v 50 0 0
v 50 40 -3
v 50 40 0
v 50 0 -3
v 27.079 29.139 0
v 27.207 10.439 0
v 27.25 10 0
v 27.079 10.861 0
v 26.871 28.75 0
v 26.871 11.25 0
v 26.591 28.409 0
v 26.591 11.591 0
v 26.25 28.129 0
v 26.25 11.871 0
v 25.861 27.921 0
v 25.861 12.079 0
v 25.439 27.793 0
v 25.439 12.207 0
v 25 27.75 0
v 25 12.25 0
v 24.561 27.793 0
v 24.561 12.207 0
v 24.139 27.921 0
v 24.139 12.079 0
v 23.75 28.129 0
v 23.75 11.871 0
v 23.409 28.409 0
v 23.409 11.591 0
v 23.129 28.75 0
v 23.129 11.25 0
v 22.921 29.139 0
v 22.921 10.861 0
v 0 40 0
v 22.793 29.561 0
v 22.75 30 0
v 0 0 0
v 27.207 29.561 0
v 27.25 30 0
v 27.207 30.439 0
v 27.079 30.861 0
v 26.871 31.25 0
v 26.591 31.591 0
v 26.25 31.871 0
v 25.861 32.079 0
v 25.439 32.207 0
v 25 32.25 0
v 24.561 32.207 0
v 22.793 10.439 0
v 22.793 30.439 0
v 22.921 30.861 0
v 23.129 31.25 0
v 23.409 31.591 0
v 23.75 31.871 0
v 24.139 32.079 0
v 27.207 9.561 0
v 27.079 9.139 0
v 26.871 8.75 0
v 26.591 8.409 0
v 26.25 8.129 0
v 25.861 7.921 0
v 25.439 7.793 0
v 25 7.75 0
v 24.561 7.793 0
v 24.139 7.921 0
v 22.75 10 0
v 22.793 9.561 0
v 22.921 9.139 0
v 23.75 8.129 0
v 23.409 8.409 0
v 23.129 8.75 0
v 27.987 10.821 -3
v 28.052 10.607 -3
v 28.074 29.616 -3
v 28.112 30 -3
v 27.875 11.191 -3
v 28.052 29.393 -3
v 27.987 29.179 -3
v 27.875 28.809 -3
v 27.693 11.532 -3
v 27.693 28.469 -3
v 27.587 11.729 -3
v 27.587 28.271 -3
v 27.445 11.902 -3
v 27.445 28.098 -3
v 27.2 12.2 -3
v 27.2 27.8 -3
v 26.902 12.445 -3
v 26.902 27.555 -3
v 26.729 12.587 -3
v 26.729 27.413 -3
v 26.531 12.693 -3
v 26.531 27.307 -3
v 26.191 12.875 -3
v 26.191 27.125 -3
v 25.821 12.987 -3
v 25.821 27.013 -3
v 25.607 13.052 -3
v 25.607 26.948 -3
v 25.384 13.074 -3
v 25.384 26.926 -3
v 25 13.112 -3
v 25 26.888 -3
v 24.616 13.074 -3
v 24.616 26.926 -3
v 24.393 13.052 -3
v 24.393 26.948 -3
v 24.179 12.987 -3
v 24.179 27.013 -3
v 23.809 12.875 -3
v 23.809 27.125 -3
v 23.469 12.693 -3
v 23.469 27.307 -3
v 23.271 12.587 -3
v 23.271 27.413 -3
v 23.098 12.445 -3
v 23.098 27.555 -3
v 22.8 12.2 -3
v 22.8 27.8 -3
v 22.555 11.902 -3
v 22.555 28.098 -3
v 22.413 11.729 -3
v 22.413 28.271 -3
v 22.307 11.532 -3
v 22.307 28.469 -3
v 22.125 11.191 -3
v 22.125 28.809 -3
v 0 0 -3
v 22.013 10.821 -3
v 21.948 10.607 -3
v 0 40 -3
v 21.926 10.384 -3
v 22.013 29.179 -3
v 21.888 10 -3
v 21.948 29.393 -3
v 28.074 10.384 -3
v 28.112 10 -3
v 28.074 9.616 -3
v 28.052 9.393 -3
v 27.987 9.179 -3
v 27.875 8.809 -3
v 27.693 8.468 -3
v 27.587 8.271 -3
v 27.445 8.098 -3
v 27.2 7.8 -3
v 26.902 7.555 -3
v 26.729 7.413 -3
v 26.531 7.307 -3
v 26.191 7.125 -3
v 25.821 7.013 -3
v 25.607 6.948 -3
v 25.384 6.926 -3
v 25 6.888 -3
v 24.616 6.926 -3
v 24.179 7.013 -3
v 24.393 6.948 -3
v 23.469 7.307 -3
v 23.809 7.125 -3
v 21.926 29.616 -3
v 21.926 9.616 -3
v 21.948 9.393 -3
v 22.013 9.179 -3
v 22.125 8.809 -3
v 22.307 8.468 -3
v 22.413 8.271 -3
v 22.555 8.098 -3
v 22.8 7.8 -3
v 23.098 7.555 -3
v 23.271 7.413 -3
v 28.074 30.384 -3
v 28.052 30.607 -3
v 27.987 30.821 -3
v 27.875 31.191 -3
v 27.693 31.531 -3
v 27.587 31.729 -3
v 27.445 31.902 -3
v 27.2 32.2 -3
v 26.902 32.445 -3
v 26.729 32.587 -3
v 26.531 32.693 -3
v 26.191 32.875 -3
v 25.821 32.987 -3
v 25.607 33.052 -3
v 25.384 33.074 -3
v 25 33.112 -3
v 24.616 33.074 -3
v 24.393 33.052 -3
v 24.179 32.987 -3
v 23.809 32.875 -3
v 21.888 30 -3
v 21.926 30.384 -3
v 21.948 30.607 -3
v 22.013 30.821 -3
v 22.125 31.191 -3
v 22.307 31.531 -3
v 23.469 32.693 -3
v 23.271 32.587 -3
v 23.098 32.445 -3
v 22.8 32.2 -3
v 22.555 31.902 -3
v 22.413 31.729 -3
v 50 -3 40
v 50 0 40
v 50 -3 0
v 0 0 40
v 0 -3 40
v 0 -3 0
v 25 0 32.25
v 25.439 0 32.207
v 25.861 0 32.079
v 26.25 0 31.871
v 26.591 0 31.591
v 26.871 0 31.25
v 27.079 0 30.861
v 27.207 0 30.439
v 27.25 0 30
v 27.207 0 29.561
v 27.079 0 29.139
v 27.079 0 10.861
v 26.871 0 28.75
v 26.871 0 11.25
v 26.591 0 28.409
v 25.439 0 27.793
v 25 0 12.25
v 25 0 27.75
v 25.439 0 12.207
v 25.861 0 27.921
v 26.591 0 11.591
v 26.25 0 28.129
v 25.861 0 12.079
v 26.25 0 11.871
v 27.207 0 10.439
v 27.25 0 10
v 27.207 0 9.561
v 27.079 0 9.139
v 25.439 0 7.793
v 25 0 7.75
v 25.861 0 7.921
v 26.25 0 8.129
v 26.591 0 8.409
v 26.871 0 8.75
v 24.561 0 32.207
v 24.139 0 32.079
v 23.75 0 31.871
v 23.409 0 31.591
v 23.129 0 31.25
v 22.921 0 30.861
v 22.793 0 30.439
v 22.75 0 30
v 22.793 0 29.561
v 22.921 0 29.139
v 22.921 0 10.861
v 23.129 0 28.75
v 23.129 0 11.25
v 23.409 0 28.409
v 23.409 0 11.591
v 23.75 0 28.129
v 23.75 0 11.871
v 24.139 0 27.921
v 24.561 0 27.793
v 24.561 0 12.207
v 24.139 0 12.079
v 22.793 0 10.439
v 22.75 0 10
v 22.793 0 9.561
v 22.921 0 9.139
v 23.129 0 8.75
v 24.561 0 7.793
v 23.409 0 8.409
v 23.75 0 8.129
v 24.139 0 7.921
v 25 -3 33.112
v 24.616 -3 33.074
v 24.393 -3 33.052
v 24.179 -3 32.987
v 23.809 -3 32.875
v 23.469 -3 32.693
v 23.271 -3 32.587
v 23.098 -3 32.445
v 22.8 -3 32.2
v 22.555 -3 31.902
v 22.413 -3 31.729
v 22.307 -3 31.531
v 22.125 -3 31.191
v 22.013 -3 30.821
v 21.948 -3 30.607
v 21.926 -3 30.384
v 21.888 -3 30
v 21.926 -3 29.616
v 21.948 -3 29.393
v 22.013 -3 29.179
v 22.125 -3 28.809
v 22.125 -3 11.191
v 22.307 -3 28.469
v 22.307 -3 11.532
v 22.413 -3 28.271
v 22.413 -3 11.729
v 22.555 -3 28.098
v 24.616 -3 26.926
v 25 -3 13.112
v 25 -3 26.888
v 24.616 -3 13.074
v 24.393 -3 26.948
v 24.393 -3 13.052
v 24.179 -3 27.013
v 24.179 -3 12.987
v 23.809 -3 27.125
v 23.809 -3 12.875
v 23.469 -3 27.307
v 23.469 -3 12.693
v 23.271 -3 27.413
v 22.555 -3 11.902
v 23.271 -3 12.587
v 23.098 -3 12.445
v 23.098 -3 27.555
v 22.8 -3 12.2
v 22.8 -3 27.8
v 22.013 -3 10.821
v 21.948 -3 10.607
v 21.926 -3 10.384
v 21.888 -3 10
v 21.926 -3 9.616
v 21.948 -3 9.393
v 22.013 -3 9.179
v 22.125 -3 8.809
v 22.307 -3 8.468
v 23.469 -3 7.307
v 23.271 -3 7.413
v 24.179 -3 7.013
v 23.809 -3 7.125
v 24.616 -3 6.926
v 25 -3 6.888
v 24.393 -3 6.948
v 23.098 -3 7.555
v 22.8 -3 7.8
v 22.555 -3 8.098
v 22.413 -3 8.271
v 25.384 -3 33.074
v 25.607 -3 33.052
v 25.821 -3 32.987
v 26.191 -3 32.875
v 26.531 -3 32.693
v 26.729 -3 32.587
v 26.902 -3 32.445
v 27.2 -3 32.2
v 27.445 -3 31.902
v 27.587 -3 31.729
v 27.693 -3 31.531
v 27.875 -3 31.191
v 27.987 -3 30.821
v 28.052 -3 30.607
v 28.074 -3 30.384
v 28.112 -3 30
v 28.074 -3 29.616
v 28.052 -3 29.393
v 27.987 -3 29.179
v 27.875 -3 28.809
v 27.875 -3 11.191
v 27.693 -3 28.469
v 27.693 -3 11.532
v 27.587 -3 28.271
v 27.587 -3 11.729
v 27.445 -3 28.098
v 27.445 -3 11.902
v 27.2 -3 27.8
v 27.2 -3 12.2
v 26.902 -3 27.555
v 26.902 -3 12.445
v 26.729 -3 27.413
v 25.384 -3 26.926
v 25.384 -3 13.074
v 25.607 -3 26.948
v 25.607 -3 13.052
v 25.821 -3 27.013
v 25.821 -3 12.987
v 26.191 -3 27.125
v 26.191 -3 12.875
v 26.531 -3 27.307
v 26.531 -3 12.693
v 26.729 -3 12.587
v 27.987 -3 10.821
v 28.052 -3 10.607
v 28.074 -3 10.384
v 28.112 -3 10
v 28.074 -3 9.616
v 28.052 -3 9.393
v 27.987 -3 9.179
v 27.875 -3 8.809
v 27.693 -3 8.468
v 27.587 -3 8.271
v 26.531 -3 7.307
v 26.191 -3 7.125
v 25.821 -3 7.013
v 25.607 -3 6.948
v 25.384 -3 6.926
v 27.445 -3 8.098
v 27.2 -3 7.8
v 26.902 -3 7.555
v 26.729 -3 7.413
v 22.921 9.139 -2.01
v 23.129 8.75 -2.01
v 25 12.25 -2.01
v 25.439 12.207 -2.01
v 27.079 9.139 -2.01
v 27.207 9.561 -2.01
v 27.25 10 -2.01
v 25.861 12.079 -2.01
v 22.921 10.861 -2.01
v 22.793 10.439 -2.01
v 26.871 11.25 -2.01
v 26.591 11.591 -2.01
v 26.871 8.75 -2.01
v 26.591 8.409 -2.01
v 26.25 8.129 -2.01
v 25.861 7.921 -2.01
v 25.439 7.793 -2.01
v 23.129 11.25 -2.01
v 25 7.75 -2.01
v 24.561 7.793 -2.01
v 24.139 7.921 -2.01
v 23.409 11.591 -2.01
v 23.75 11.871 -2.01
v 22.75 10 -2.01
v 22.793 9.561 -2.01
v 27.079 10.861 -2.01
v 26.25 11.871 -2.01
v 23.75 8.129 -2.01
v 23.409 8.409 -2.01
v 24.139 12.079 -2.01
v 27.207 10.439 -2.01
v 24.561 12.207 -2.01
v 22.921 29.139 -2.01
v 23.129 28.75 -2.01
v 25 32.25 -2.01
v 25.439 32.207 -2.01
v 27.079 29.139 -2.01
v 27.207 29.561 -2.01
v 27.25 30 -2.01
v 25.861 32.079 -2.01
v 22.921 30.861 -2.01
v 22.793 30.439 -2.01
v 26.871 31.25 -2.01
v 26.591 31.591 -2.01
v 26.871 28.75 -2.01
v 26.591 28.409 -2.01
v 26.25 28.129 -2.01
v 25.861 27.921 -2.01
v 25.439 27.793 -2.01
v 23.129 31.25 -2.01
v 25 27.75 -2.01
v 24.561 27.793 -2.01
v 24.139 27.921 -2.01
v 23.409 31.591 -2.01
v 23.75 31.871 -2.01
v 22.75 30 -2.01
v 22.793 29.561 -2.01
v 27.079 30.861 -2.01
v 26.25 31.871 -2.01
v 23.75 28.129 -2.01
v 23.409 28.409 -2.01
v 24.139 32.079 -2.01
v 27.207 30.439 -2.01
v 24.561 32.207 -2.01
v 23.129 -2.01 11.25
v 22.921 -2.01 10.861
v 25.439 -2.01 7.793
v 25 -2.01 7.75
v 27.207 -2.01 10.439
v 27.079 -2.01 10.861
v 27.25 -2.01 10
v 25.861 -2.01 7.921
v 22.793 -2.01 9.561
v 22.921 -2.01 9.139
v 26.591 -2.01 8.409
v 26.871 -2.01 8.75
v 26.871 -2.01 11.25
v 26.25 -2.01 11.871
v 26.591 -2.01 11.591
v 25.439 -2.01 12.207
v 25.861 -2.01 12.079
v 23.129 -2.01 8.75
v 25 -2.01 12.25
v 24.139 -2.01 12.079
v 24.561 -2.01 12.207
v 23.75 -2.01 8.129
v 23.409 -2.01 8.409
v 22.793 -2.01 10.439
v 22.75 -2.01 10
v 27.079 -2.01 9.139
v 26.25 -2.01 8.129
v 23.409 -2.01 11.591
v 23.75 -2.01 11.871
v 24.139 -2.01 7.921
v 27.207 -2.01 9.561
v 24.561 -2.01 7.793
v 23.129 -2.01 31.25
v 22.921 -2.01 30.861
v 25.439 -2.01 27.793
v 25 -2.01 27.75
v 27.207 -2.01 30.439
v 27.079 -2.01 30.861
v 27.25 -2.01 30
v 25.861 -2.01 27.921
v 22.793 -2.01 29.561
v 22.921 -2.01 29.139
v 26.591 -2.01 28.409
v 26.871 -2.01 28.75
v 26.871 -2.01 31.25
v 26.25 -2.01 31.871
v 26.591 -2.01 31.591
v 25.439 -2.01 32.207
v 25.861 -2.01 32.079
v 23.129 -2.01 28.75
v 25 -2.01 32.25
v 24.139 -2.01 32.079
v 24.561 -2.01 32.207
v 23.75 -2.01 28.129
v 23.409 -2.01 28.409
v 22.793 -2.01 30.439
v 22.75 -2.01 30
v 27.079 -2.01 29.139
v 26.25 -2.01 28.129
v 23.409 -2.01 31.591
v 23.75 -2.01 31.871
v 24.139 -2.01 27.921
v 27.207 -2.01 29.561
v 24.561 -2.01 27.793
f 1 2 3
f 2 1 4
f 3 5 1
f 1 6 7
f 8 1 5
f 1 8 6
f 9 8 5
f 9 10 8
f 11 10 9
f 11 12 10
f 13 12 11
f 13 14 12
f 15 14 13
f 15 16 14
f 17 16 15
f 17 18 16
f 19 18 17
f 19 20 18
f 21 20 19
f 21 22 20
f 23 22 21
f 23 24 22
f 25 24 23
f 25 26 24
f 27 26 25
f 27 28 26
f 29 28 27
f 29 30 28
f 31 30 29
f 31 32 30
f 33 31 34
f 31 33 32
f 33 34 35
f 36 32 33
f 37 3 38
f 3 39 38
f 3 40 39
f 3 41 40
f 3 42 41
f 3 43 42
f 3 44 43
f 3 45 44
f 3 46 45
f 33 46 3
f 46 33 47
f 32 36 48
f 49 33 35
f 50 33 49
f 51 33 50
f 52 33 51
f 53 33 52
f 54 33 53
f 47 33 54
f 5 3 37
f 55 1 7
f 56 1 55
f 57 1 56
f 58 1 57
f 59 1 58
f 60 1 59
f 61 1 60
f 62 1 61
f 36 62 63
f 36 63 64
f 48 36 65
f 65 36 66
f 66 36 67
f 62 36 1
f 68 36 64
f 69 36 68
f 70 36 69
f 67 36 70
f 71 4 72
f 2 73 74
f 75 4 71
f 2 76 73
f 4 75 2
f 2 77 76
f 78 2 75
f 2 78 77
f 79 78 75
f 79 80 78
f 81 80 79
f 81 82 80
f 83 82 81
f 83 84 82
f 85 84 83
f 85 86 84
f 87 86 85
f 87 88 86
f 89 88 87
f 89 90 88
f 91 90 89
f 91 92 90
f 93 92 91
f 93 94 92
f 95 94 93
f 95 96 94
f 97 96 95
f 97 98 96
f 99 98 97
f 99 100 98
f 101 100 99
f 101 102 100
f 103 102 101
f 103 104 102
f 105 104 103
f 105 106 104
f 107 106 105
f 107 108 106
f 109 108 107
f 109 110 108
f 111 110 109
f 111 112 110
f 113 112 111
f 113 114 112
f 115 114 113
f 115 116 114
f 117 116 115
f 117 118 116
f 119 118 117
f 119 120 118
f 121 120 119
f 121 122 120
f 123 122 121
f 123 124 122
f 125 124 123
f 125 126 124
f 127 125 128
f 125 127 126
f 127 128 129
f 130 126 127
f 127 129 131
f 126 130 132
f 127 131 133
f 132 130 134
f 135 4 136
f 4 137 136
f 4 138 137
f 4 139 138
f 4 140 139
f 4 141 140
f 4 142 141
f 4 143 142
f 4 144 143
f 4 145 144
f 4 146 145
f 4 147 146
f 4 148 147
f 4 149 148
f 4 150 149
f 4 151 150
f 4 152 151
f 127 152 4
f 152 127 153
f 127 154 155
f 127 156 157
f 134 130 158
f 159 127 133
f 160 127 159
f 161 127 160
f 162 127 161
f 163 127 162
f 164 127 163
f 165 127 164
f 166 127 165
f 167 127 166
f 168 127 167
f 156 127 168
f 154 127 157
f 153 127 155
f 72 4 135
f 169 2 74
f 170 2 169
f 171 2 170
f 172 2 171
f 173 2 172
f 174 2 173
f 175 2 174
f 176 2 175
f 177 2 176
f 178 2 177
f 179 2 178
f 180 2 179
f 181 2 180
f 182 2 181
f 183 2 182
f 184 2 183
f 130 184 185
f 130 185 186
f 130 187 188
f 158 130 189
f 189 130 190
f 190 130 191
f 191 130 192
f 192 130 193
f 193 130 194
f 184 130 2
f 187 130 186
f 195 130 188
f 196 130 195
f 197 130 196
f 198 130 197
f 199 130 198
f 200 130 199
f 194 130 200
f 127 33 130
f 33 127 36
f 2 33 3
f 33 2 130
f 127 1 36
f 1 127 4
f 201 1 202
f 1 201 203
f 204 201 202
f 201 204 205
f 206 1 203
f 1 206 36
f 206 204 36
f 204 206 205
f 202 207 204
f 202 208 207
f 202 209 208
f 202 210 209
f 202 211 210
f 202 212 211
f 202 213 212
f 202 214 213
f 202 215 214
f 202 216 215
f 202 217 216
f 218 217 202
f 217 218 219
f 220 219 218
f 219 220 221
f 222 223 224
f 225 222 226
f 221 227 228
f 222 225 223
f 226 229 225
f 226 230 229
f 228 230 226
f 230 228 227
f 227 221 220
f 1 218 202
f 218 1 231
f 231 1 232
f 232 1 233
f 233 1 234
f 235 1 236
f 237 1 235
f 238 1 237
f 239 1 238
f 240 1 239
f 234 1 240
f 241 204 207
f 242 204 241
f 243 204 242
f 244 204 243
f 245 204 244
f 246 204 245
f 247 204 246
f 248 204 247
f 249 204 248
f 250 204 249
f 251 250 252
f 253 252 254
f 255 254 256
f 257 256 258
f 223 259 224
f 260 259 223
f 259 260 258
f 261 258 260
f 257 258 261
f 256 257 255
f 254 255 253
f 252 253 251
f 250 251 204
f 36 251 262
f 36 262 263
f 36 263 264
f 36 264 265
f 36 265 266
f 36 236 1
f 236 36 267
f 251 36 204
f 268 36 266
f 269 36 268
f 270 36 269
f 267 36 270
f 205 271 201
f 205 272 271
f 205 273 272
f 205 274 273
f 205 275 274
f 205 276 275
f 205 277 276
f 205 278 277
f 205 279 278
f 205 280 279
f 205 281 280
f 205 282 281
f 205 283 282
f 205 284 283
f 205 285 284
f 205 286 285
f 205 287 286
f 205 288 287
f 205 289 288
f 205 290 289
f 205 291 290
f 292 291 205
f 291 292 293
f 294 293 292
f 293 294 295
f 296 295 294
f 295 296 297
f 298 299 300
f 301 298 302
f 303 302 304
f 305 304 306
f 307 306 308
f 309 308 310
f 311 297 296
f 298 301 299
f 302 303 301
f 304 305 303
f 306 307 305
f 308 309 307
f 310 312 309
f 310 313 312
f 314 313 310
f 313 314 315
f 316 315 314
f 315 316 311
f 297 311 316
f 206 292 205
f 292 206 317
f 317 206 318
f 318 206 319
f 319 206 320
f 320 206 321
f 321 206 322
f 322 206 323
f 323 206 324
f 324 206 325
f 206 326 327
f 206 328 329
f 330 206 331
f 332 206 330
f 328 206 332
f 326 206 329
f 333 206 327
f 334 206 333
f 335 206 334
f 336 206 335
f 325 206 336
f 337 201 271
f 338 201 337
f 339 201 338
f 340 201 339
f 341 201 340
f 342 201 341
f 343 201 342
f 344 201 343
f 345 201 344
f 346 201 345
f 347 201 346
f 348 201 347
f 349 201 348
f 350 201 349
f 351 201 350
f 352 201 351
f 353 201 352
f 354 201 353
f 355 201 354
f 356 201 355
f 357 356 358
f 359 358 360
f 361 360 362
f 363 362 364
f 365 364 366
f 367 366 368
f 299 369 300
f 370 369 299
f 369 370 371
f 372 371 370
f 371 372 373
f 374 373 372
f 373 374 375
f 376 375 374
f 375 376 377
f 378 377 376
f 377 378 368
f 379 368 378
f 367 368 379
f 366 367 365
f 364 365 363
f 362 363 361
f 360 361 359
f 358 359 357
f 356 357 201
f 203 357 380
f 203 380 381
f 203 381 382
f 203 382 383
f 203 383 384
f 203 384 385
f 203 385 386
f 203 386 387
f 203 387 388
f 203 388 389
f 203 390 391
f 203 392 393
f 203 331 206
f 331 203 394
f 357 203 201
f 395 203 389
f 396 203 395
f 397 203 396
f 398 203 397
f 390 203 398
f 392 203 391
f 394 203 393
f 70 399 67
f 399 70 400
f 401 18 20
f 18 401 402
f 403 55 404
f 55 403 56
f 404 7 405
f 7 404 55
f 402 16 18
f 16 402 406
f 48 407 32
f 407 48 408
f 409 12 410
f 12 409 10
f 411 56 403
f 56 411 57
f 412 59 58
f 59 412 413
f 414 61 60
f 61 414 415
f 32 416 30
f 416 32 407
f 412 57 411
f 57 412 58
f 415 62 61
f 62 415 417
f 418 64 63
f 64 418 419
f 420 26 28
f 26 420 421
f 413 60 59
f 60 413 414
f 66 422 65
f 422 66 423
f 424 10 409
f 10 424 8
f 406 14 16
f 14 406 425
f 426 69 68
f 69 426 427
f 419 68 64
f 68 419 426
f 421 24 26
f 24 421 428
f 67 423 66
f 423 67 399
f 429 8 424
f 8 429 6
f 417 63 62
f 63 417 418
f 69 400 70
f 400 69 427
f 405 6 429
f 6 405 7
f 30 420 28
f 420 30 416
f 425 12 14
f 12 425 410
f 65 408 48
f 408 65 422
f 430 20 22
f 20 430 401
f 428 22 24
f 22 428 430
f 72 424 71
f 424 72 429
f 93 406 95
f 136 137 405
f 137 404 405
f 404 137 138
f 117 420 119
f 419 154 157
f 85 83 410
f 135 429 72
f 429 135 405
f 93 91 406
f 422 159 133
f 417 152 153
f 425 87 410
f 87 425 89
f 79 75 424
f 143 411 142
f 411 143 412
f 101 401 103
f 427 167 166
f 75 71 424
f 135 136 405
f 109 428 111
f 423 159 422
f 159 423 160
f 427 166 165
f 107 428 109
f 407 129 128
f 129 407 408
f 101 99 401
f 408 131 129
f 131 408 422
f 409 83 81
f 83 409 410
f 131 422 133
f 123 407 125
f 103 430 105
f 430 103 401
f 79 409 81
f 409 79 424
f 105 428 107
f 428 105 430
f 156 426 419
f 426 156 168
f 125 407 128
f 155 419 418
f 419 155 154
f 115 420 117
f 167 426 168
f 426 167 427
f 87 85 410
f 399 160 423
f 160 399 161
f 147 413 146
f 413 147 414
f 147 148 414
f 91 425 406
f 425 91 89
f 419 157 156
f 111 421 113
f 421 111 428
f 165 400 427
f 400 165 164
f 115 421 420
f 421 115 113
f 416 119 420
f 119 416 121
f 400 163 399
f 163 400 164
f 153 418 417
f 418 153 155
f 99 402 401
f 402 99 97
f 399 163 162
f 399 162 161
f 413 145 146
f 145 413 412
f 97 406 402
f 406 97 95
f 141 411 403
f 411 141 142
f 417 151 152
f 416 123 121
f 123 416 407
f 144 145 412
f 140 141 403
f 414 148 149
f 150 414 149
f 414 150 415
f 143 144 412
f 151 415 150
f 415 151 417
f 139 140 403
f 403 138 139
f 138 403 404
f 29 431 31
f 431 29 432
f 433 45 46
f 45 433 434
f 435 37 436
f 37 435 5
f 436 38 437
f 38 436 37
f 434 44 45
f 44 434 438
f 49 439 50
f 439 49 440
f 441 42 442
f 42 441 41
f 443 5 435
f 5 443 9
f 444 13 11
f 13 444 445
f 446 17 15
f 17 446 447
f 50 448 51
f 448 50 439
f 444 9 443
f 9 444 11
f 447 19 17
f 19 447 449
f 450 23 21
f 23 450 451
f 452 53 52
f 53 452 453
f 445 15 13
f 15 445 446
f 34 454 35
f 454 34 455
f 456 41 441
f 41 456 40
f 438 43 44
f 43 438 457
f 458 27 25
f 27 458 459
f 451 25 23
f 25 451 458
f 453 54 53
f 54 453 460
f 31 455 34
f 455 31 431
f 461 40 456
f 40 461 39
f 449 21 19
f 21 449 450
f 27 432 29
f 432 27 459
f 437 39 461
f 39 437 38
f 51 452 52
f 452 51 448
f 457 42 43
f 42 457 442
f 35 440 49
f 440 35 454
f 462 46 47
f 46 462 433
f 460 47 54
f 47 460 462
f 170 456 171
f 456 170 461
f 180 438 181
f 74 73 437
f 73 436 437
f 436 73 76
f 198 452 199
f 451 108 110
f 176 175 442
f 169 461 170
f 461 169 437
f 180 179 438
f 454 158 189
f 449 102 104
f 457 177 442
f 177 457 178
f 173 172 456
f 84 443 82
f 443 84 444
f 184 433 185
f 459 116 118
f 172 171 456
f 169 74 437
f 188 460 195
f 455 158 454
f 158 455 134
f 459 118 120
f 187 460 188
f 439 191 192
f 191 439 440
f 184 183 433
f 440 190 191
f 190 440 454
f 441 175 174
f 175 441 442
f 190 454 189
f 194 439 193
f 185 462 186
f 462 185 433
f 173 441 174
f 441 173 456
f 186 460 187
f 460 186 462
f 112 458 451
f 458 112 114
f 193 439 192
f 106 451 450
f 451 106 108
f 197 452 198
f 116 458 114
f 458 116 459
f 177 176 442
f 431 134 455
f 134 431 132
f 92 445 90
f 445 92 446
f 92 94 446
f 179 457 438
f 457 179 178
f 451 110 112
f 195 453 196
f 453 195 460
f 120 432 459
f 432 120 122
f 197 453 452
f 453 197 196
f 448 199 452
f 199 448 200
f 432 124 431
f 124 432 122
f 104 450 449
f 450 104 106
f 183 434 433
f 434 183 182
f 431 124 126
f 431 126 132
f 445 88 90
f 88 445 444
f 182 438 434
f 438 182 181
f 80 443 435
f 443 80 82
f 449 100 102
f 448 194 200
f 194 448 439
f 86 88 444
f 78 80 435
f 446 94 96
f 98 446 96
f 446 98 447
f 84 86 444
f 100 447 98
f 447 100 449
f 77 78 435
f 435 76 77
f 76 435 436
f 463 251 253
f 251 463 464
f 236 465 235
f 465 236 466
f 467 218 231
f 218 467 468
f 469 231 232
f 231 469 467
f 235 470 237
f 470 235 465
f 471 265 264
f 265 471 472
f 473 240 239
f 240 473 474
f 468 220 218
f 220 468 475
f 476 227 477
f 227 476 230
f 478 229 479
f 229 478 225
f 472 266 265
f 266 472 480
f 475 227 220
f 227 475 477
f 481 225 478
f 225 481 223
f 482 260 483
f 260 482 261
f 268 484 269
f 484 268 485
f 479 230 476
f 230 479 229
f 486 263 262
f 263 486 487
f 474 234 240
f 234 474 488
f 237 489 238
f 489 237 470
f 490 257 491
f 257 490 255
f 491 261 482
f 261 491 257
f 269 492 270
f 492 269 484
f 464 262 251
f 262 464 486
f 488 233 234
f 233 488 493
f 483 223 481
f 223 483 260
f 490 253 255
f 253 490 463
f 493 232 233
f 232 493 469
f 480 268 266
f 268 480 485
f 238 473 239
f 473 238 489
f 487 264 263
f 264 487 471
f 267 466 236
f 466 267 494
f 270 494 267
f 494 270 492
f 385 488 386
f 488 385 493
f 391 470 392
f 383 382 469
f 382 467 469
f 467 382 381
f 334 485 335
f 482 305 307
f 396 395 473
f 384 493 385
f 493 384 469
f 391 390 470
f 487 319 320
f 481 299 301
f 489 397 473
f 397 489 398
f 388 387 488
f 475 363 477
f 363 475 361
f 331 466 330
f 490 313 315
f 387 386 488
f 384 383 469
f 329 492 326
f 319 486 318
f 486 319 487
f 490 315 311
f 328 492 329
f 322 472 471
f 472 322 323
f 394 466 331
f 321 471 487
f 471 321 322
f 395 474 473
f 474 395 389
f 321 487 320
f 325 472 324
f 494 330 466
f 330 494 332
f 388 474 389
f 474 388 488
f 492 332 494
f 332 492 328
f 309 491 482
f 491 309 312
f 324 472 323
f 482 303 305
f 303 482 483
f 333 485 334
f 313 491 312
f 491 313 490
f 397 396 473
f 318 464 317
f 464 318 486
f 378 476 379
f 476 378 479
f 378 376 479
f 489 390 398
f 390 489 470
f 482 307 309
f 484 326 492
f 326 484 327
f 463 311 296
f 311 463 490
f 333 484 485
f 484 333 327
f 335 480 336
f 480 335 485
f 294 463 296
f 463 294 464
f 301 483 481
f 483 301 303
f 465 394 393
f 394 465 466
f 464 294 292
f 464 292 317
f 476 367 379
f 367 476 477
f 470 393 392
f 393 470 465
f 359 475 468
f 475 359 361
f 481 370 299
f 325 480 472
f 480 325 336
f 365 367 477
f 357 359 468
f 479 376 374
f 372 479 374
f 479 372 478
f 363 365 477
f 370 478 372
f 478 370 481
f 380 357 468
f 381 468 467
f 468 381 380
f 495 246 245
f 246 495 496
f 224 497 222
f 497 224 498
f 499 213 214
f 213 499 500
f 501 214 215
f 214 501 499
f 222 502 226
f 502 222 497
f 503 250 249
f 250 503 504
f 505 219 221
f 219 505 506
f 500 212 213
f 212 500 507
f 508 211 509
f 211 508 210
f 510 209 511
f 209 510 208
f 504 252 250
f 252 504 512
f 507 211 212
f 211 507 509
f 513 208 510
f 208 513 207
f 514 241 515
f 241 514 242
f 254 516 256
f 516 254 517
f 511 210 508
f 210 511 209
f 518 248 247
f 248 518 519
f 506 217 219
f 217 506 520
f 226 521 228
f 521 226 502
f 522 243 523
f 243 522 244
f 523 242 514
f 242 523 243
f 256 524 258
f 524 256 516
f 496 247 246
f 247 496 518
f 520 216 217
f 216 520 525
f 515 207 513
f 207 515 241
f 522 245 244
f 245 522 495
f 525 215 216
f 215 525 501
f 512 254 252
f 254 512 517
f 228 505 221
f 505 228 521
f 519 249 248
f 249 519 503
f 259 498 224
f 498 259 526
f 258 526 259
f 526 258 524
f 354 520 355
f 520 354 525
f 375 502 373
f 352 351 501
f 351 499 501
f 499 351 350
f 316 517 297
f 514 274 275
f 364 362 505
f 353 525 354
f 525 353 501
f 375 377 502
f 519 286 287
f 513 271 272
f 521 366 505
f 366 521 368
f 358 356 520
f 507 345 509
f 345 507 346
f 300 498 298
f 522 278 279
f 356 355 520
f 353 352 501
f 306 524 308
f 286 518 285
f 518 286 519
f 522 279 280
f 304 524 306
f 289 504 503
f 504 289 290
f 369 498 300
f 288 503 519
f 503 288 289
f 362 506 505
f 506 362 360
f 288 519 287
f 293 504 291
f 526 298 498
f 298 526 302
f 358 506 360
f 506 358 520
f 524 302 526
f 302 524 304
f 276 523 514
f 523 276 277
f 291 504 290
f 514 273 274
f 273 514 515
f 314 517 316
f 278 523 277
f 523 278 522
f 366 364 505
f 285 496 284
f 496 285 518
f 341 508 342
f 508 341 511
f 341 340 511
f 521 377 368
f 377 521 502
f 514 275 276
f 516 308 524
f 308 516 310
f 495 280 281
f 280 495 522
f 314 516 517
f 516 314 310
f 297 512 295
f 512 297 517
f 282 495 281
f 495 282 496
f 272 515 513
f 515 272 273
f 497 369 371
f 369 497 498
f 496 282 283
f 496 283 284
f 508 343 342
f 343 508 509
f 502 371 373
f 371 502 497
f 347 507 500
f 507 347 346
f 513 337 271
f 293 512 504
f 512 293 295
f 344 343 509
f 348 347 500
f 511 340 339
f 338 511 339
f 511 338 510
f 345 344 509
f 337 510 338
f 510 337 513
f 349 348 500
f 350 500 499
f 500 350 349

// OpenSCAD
// L-bracket with countersunk holes

// Parameters
flange_width = 50;      // X direction
flange_depth = 40;      // Y direction for horizontal, Z direction for vertical
thickness = 3;

// Countersunk hole parameters
hole_diameter = 4.5;    // M4 through hole
countersink_diameter = 8;
countersink_depth = 2;
edge_distance = 10;     // Distance from edge to hole center

// Module for countersunk hole (pointing in -Z direction, countersink on top)
module countersunk_hole() {
    union() {
        // Through hole
        cylinder(h = thickness + 1, d = hole_diameter, center = true, $fn = 32);
        // Countersink (cone + cylinder for flat bottom)
        translate([0, 0, thickness/2 - countersink_depth/2 + 0.01])
            cylinder(h = countersink_depth + 0.01, d1 = hole_diameter, d2 = countersink_diameter, $fn = 32);
    }
}

// Hole positions on horizontal flange (Y-Z plane holes, on surface facing -Z)
hole_x_offset = flange_width / 2;  // Center line
hole_y_positions = [edge_distance, flange_depth - edge_distance];

// Hole positions on vertical flange
hole_z_positions = [edge_distance, flange_depth - edge_distance];

difference() {
    union() {
        // Horizontal flange (+Y direction, sitting on Z=0 plane going down in -Z)
        // Actually: horizontal flange extends in +Y, thickness goes in -Z direction
        translate([0, 0, -thickness])
            cube([flange_width, flange_depth, thickness]);
        
        // Vertical flange (+Z direction)
        translate([0, -thickness, 0])
            cube([flange_width, thickness, flange_depth]);
    }
    
    // Countersunk holes on horizontal flange (countersink on bottom, -Z side)
    for (y = hole_y_positions) {
        translate([hole_x_offset, y, -thickness/2])
            rotate([180, 0, 0])
                countersunk_hole();
    }
    
    // Countersunk holes on vertical flange (countersink on -Y side, outside)
    for (z = hole_z_positions) {
        translate([hole_x_offset, -thickness/2, z])
            rotate([90, 0, 0])
                countersunk_hole();
    }
}
